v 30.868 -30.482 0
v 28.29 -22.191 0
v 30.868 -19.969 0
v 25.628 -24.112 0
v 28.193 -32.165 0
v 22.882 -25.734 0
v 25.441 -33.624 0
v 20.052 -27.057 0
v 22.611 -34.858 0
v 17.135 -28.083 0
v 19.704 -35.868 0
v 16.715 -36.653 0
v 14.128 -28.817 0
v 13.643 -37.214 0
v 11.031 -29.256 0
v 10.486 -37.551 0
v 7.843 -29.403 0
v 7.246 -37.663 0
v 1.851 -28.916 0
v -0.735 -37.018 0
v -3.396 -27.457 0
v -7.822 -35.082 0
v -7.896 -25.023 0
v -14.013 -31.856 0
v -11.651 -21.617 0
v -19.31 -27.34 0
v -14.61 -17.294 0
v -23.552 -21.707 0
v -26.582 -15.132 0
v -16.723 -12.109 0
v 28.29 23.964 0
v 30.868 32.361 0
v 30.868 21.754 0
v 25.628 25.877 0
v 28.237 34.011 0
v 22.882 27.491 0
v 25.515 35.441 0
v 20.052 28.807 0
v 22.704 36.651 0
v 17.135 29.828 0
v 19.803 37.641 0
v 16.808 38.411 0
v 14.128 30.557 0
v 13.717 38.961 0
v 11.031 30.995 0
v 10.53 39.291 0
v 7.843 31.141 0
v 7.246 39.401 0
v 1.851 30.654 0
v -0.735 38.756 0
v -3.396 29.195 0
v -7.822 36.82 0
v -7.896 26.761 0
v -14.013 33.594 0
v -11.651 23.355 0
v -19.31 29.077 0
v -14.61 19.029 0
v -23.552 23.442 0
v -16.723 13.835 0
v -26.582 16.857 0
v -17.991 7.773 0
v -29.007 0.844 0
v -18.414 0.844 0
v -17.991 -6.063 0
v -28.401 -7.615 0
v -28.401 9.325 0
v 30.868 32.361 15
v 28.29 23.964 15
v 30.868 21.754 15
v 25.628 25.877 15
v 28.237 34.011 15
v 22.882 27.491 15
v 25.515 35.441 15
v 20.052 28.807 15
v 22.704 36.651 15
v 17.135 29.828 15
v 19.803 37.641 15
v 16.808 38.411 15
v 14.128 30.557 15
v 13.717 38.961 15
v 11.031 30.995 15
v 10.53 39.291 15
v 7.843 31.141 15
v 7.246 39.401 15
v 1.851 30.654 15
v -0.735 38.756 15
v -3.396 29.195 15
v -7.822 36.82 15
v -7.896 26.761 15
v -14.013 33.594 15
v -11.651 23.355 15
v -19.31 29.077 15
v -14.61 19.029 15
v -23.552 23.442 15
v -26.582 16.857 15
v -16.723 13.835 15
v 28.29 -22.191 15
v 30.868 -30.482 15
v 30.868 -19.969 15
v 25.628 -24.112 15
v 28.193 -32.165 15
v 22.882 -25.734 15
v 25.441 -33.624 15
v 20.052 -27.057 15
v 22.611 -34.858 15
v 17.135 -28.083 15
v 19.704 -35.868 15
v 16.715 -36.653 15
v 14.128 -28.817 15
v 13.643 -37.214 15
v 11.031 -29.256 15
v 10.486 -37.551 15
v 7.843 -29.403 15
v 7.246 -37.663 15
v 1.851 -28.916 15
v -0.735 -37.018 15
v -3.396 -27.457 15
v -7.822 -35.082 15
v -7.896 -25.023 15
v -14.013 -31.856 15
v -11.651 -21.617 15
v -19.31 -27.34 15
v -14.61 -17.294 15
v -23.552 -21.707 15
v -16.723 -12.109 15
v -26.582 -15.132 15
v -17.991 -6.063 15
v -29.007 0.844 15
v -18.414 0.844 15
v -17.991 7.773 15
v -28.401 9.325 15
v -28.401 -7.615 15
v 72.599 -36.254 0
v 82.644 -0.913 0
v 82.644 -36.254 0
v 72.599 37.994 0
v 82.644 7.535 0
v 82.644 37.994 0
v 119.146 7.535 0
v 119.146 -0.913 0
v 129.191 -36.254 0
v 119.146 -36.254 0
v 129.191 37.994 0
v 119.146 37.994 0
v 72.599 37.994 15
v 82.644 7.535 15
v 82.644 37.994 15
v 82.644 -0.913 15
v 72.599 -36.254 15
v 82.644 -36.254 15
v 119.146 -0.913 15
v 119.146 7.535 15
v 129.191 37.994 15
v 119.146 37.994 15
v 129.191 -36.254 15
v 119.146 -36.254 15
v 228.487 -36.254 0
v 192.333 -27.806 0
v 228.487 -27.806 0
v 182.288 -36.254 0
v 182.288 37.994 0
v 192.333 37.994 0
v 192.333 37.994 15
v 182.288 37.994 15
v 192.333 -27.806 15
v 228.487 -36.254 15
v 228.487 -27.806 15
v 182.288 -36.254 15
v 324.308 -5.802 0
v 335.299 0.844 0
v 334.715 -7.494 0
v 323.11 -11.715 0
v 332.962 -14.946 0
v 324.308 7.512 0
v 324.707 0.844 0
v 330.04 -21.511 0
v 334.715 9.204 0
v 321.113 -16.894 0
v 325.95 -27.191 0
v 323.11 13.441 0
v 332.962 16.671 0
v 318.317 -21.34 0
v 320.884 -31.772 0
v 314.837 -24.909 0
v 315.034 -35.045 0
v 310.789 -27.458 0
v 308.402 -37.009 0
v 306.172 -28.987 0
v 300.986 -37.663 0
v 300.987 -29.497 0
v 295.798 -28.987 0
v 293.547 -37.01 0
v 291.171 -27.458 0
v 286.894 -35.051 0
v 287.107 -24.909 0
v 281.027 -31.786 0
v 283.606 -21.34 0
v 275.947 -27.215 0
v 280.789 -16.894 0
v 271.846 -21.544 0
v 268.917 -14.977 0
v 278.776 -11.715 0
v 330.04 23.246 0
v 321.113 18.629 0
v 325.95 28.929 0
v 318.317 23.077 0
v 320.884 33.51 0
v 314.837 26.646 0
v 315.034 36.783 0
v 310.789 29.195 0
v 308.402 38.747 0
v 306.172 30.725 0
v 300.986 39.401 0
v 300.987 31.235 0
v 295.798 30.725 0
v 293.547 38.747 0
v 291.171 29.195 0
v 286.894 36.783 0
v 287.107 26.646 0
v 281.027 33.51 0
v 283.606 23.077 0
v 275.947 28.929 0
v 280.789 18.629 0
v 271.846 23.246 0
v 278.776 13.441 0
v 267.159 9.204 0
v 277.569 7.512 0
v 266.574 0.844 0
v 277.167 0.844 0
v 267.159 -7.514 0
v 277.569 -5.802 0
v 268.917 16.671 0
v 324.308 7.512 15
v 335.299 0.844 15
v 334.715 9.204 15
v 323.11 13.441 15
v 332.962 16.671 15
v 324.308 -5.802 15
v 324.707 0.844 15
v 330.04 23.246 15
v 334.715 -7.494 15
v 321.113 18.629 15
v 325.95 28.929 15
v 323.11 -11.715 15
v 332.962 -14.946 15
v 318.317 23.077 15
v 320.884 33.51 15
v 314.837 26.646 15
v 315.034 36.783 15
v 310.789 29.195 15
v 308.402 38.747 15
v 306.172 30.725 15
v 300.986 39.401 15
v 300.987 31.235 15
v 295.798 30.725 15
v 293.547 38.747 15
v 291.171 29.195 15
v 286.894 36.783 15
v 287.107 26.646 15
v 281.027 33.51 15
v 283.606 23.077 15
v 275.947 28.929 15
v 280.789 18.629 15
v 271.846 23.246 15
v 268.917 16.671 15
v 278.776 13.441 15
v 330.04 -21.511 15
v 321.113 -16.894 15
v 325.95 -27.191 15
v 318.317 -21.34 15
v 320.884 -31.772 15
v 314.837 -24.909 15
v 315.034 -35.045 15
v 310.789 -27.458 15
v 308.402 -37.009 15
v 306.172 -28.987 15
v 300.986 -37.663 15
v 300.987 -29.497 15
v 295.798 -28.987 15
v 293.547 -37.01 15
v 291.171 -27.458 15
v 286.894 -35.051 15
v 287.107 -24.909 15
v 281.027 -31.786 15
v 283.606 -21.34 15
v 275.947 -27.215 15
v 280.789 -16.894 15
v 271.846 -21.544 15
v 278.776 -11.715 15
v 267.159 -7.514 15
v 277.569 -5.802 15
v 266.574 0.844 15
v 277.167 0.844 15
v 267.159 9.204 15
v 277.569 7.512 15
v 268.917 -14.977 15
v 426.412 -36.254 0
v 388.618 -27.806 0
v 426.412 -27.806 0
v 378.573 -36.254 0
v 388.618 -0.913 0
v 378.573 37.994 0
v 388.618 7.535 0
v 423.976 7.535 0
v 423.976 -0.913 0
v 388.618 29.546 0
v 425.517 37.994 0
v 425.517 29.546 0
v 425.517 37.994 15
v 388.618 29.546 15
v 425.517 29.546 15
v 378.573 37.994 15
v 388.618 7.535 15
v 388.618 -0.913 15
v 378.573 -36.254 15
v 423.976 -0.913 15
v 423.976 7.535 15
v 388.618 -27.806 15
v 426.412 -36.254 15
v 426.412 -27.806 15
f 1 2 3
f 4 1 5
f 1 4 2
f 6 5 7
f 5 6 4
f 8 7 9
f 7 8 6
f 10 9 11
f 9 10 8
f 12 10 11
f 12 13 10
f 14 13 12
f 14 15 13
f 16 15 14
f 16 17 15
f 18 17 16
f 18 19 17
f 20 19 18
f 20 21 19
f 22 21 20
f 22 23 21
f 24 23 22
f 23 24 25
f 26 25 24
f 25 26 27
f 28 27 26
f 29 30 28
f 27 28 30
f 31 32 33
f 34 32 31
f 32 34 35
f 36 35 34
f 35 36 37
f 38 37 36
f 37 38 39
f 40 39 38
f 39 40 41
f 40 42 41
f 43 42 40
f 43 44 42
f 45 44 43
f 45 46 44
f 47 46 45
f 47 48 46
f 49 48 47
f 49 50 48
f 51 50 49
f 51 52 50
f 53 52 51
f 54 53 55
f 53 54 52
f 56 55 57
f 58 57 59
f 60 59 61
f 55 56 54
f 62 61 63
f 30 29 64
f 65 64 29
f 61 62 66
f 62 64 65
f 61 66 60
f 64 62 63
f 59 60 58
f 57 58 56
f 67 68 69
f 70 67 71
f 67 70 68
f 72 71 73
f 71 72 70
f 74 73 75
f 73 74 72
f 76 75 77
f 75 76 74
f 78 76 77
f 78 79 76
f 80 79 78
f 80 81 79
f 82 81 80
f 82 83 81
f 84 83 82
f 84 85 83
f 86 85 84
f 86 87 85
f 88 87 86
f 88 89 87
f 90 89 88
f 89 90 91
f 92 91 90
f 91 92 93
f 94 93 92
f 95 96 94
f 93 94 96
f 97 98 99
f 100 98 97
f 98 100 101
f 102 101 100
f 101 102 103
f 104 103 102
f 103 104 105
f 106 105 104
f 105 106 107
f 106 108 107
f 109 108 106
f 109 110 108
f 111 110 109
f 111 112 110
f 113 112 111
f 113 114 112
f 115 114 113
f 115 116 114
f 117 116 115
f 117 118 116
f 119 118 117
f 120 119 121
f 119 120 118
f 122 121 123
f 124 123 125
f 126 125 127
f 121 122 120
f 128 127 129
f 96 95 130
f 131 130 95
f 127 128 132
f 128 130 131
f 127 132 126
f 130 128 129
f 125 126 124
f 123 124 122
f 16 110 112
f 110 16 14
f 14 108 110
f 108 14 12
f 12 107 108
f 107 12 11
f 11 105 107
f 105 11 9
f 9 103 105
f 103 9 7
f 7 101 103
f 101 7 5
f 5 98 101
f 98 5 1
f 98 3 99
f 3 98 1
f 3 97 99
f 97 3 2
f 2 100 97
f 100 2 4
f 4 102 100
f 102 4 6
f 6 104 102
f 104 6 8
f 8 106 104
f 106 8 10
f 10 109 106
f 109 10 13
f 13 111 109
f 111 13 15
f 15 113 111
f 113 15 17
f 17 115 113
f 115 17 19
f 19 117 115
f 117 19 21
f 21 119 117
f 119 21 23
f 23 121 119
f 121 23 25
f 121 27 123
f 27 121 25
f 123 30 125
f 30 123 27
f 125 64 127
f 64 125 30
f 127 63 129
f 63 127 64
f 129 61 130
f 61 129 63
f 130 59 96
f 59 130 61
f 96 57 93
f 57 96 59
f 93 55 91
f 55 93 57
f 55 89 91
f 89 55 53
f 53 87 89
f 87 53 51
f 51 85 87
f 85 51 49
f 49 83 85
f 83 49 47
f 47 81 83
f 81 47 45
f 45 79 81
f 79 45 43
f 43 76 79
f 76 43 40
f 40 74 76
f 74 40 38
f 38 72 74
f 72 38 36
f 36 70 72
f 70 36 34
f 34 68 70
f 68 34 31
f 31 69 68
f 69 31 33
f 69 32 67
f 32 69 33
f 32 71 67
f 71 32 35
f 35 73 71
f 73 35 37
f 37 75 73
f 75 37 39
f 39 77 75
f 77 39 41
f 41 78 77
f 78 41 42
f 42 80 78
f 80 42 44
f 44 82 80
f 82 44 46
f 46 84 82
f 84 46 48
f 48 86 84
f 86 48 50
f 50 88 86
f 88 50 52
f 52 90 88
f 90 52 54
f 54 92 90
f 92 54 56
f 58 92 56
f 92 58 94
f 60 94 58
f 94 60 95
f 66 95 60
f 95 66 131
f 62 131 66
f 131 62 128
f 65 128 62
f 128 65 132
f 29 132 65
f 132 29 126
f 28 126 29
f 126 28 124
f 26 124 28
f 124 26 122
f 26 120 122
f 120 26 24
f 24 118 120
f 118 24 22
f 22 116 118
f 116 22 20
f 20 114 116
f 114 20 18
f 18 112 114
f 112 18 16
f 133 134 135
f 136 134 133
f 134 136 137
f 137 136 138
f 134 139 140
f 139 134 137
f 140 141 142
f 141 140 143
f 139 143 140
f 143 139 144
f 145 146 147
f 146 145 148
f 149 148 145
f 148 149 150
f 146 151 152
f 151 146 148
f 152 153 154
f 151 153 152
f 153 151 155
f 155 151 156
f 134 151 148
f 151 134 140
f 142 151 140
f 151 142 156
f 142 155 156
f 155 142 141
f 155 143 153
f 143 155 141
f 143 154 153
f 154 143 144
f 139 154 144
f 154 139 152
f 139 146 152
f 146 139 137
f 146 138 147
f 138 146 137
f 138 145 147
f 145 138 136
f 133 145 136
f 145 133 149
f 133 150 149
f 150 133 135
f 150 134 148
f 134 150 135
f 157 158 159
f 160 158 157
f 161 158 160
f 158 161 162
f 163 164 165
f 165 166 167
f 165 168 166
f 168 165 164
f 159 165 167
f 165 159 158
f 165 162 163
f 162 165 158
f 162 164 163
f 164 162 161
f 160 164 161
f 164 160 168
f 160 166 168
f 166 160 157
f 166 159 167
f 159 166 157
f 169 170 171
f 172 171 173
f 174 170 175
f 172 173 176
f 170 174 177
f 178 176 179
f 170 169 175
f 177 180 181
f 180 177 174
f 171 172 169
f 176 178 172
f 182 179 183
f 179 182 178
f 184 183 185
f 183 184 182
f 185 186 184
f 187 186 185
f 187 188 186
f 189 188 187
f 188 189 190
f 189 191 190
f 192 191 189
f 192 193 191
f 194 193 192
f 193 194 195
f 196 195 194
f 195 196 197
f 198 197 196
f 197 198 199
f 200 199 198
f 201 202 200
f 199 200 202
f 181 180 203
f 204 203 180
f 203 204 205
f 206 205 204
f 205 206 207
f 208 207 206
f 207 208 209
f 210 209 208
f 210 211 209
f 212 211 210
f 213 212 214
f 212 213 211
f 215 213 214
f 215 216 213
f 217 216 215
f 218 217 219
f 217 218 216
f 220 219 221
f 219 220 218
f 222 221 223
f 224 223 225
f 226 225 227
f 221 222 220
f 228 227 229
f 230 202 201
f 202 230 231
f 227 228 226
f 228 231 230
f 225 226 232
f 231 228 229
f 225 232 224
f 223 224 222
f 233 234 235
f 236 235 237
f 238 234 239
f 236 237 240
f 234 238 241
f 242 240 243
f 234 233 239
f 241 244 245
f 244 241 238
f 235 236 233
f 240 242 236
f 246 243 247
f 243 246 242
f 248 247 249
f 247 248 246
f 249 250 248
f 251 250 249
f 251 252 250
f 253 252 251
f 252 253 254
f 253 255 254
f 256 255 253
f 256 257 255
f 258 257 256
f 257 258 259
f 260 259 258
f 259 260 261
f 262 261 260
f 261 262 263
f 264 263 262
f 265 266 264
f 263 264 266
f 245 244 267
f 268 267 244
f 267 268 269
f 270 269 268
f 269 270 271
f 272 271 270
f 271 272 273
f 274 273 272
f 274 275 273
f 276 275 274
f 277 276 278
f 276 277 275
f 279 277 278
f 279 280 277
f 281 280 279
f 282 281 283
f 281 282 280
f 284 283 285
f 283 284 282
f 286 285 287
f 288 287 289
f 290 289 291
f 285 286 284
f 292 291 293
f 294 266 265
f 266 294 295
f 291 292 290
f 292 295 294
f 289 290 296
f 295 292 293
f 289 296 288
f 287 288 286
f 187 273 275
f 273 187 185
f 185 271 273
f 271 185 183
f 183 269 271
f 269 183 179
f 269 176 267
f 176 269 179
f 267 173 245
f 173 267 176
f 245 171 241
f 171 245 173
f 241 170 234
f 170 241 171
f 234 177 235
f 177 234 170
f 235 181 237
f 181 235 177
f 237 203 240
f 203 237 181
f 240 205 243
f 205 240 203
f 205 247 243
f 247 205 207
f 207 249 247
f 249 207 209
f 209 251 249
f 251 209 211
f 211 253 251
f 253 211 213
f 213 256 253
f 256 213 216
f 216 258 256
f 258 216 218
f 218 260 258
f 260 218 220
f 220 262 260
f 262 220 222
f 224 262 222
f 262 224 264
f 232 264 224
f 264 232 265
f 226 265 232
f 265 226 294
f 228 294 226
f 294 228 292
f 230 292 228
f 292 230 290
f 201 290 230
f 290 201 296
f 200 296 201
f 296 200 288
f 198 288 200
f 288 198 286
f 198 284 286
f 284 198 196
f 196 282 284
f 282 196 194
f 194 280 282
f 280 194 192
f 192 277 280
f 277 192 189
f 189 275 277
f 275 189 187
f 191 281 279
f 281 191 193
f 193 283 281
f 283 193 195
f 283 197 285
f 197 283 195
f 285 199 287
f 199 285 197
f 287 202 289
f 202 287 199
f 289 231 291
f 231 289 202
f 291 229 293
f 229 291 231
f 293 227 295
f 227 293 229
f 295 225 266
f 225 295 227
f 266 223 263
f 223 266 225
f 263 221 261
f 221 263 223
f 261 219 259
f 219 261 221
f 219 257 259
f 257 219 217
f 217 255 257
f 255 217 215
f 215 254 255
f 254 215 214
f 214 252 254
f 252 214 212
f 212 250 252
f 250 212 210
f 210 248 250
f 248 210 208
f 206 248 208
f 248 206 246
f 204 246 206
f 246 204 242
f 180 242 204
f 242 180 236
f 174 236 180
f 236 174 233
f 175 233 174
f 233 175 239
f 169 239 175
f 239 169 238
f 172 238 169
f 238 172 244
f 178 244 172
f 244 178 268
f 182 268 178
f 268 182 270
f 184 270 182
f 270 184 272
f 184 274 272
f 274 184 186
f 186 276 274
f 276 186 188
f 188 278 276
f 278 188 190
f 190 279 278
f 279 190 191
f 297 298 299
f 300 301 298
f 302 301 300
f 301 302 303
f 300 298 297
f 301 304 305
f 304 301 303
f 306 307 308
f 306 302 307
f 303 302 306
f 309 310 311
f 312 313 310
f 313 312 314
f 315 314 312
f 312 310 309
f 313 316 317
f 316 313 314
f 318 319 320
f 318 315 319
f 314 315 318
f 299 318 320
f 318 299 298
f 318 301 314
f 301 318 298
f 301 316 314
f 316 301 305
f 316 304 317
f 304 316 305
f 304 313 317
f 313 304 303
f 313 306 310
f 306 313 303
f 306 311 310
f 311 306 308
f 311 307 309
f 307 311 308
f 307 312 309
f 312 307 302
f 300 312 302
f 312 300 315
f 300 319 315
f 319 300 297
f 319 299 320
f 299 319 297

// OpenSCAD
letters = "CHLOE";
size = 100;

// translate ([0,0,0]) import ("heart.stl");

// Font : Niconne
// Font Palatino Linotype
for (i= [0 : 1 : len(letters) - 1]) {
    echo(letters[i]);
    translate([i*size,0,0])
        linear_extrude(height = 15)
            text(letters[i], 
             size=size*22/30,
             font="Niconne",
             halign="center",
             valign="center");            
}
